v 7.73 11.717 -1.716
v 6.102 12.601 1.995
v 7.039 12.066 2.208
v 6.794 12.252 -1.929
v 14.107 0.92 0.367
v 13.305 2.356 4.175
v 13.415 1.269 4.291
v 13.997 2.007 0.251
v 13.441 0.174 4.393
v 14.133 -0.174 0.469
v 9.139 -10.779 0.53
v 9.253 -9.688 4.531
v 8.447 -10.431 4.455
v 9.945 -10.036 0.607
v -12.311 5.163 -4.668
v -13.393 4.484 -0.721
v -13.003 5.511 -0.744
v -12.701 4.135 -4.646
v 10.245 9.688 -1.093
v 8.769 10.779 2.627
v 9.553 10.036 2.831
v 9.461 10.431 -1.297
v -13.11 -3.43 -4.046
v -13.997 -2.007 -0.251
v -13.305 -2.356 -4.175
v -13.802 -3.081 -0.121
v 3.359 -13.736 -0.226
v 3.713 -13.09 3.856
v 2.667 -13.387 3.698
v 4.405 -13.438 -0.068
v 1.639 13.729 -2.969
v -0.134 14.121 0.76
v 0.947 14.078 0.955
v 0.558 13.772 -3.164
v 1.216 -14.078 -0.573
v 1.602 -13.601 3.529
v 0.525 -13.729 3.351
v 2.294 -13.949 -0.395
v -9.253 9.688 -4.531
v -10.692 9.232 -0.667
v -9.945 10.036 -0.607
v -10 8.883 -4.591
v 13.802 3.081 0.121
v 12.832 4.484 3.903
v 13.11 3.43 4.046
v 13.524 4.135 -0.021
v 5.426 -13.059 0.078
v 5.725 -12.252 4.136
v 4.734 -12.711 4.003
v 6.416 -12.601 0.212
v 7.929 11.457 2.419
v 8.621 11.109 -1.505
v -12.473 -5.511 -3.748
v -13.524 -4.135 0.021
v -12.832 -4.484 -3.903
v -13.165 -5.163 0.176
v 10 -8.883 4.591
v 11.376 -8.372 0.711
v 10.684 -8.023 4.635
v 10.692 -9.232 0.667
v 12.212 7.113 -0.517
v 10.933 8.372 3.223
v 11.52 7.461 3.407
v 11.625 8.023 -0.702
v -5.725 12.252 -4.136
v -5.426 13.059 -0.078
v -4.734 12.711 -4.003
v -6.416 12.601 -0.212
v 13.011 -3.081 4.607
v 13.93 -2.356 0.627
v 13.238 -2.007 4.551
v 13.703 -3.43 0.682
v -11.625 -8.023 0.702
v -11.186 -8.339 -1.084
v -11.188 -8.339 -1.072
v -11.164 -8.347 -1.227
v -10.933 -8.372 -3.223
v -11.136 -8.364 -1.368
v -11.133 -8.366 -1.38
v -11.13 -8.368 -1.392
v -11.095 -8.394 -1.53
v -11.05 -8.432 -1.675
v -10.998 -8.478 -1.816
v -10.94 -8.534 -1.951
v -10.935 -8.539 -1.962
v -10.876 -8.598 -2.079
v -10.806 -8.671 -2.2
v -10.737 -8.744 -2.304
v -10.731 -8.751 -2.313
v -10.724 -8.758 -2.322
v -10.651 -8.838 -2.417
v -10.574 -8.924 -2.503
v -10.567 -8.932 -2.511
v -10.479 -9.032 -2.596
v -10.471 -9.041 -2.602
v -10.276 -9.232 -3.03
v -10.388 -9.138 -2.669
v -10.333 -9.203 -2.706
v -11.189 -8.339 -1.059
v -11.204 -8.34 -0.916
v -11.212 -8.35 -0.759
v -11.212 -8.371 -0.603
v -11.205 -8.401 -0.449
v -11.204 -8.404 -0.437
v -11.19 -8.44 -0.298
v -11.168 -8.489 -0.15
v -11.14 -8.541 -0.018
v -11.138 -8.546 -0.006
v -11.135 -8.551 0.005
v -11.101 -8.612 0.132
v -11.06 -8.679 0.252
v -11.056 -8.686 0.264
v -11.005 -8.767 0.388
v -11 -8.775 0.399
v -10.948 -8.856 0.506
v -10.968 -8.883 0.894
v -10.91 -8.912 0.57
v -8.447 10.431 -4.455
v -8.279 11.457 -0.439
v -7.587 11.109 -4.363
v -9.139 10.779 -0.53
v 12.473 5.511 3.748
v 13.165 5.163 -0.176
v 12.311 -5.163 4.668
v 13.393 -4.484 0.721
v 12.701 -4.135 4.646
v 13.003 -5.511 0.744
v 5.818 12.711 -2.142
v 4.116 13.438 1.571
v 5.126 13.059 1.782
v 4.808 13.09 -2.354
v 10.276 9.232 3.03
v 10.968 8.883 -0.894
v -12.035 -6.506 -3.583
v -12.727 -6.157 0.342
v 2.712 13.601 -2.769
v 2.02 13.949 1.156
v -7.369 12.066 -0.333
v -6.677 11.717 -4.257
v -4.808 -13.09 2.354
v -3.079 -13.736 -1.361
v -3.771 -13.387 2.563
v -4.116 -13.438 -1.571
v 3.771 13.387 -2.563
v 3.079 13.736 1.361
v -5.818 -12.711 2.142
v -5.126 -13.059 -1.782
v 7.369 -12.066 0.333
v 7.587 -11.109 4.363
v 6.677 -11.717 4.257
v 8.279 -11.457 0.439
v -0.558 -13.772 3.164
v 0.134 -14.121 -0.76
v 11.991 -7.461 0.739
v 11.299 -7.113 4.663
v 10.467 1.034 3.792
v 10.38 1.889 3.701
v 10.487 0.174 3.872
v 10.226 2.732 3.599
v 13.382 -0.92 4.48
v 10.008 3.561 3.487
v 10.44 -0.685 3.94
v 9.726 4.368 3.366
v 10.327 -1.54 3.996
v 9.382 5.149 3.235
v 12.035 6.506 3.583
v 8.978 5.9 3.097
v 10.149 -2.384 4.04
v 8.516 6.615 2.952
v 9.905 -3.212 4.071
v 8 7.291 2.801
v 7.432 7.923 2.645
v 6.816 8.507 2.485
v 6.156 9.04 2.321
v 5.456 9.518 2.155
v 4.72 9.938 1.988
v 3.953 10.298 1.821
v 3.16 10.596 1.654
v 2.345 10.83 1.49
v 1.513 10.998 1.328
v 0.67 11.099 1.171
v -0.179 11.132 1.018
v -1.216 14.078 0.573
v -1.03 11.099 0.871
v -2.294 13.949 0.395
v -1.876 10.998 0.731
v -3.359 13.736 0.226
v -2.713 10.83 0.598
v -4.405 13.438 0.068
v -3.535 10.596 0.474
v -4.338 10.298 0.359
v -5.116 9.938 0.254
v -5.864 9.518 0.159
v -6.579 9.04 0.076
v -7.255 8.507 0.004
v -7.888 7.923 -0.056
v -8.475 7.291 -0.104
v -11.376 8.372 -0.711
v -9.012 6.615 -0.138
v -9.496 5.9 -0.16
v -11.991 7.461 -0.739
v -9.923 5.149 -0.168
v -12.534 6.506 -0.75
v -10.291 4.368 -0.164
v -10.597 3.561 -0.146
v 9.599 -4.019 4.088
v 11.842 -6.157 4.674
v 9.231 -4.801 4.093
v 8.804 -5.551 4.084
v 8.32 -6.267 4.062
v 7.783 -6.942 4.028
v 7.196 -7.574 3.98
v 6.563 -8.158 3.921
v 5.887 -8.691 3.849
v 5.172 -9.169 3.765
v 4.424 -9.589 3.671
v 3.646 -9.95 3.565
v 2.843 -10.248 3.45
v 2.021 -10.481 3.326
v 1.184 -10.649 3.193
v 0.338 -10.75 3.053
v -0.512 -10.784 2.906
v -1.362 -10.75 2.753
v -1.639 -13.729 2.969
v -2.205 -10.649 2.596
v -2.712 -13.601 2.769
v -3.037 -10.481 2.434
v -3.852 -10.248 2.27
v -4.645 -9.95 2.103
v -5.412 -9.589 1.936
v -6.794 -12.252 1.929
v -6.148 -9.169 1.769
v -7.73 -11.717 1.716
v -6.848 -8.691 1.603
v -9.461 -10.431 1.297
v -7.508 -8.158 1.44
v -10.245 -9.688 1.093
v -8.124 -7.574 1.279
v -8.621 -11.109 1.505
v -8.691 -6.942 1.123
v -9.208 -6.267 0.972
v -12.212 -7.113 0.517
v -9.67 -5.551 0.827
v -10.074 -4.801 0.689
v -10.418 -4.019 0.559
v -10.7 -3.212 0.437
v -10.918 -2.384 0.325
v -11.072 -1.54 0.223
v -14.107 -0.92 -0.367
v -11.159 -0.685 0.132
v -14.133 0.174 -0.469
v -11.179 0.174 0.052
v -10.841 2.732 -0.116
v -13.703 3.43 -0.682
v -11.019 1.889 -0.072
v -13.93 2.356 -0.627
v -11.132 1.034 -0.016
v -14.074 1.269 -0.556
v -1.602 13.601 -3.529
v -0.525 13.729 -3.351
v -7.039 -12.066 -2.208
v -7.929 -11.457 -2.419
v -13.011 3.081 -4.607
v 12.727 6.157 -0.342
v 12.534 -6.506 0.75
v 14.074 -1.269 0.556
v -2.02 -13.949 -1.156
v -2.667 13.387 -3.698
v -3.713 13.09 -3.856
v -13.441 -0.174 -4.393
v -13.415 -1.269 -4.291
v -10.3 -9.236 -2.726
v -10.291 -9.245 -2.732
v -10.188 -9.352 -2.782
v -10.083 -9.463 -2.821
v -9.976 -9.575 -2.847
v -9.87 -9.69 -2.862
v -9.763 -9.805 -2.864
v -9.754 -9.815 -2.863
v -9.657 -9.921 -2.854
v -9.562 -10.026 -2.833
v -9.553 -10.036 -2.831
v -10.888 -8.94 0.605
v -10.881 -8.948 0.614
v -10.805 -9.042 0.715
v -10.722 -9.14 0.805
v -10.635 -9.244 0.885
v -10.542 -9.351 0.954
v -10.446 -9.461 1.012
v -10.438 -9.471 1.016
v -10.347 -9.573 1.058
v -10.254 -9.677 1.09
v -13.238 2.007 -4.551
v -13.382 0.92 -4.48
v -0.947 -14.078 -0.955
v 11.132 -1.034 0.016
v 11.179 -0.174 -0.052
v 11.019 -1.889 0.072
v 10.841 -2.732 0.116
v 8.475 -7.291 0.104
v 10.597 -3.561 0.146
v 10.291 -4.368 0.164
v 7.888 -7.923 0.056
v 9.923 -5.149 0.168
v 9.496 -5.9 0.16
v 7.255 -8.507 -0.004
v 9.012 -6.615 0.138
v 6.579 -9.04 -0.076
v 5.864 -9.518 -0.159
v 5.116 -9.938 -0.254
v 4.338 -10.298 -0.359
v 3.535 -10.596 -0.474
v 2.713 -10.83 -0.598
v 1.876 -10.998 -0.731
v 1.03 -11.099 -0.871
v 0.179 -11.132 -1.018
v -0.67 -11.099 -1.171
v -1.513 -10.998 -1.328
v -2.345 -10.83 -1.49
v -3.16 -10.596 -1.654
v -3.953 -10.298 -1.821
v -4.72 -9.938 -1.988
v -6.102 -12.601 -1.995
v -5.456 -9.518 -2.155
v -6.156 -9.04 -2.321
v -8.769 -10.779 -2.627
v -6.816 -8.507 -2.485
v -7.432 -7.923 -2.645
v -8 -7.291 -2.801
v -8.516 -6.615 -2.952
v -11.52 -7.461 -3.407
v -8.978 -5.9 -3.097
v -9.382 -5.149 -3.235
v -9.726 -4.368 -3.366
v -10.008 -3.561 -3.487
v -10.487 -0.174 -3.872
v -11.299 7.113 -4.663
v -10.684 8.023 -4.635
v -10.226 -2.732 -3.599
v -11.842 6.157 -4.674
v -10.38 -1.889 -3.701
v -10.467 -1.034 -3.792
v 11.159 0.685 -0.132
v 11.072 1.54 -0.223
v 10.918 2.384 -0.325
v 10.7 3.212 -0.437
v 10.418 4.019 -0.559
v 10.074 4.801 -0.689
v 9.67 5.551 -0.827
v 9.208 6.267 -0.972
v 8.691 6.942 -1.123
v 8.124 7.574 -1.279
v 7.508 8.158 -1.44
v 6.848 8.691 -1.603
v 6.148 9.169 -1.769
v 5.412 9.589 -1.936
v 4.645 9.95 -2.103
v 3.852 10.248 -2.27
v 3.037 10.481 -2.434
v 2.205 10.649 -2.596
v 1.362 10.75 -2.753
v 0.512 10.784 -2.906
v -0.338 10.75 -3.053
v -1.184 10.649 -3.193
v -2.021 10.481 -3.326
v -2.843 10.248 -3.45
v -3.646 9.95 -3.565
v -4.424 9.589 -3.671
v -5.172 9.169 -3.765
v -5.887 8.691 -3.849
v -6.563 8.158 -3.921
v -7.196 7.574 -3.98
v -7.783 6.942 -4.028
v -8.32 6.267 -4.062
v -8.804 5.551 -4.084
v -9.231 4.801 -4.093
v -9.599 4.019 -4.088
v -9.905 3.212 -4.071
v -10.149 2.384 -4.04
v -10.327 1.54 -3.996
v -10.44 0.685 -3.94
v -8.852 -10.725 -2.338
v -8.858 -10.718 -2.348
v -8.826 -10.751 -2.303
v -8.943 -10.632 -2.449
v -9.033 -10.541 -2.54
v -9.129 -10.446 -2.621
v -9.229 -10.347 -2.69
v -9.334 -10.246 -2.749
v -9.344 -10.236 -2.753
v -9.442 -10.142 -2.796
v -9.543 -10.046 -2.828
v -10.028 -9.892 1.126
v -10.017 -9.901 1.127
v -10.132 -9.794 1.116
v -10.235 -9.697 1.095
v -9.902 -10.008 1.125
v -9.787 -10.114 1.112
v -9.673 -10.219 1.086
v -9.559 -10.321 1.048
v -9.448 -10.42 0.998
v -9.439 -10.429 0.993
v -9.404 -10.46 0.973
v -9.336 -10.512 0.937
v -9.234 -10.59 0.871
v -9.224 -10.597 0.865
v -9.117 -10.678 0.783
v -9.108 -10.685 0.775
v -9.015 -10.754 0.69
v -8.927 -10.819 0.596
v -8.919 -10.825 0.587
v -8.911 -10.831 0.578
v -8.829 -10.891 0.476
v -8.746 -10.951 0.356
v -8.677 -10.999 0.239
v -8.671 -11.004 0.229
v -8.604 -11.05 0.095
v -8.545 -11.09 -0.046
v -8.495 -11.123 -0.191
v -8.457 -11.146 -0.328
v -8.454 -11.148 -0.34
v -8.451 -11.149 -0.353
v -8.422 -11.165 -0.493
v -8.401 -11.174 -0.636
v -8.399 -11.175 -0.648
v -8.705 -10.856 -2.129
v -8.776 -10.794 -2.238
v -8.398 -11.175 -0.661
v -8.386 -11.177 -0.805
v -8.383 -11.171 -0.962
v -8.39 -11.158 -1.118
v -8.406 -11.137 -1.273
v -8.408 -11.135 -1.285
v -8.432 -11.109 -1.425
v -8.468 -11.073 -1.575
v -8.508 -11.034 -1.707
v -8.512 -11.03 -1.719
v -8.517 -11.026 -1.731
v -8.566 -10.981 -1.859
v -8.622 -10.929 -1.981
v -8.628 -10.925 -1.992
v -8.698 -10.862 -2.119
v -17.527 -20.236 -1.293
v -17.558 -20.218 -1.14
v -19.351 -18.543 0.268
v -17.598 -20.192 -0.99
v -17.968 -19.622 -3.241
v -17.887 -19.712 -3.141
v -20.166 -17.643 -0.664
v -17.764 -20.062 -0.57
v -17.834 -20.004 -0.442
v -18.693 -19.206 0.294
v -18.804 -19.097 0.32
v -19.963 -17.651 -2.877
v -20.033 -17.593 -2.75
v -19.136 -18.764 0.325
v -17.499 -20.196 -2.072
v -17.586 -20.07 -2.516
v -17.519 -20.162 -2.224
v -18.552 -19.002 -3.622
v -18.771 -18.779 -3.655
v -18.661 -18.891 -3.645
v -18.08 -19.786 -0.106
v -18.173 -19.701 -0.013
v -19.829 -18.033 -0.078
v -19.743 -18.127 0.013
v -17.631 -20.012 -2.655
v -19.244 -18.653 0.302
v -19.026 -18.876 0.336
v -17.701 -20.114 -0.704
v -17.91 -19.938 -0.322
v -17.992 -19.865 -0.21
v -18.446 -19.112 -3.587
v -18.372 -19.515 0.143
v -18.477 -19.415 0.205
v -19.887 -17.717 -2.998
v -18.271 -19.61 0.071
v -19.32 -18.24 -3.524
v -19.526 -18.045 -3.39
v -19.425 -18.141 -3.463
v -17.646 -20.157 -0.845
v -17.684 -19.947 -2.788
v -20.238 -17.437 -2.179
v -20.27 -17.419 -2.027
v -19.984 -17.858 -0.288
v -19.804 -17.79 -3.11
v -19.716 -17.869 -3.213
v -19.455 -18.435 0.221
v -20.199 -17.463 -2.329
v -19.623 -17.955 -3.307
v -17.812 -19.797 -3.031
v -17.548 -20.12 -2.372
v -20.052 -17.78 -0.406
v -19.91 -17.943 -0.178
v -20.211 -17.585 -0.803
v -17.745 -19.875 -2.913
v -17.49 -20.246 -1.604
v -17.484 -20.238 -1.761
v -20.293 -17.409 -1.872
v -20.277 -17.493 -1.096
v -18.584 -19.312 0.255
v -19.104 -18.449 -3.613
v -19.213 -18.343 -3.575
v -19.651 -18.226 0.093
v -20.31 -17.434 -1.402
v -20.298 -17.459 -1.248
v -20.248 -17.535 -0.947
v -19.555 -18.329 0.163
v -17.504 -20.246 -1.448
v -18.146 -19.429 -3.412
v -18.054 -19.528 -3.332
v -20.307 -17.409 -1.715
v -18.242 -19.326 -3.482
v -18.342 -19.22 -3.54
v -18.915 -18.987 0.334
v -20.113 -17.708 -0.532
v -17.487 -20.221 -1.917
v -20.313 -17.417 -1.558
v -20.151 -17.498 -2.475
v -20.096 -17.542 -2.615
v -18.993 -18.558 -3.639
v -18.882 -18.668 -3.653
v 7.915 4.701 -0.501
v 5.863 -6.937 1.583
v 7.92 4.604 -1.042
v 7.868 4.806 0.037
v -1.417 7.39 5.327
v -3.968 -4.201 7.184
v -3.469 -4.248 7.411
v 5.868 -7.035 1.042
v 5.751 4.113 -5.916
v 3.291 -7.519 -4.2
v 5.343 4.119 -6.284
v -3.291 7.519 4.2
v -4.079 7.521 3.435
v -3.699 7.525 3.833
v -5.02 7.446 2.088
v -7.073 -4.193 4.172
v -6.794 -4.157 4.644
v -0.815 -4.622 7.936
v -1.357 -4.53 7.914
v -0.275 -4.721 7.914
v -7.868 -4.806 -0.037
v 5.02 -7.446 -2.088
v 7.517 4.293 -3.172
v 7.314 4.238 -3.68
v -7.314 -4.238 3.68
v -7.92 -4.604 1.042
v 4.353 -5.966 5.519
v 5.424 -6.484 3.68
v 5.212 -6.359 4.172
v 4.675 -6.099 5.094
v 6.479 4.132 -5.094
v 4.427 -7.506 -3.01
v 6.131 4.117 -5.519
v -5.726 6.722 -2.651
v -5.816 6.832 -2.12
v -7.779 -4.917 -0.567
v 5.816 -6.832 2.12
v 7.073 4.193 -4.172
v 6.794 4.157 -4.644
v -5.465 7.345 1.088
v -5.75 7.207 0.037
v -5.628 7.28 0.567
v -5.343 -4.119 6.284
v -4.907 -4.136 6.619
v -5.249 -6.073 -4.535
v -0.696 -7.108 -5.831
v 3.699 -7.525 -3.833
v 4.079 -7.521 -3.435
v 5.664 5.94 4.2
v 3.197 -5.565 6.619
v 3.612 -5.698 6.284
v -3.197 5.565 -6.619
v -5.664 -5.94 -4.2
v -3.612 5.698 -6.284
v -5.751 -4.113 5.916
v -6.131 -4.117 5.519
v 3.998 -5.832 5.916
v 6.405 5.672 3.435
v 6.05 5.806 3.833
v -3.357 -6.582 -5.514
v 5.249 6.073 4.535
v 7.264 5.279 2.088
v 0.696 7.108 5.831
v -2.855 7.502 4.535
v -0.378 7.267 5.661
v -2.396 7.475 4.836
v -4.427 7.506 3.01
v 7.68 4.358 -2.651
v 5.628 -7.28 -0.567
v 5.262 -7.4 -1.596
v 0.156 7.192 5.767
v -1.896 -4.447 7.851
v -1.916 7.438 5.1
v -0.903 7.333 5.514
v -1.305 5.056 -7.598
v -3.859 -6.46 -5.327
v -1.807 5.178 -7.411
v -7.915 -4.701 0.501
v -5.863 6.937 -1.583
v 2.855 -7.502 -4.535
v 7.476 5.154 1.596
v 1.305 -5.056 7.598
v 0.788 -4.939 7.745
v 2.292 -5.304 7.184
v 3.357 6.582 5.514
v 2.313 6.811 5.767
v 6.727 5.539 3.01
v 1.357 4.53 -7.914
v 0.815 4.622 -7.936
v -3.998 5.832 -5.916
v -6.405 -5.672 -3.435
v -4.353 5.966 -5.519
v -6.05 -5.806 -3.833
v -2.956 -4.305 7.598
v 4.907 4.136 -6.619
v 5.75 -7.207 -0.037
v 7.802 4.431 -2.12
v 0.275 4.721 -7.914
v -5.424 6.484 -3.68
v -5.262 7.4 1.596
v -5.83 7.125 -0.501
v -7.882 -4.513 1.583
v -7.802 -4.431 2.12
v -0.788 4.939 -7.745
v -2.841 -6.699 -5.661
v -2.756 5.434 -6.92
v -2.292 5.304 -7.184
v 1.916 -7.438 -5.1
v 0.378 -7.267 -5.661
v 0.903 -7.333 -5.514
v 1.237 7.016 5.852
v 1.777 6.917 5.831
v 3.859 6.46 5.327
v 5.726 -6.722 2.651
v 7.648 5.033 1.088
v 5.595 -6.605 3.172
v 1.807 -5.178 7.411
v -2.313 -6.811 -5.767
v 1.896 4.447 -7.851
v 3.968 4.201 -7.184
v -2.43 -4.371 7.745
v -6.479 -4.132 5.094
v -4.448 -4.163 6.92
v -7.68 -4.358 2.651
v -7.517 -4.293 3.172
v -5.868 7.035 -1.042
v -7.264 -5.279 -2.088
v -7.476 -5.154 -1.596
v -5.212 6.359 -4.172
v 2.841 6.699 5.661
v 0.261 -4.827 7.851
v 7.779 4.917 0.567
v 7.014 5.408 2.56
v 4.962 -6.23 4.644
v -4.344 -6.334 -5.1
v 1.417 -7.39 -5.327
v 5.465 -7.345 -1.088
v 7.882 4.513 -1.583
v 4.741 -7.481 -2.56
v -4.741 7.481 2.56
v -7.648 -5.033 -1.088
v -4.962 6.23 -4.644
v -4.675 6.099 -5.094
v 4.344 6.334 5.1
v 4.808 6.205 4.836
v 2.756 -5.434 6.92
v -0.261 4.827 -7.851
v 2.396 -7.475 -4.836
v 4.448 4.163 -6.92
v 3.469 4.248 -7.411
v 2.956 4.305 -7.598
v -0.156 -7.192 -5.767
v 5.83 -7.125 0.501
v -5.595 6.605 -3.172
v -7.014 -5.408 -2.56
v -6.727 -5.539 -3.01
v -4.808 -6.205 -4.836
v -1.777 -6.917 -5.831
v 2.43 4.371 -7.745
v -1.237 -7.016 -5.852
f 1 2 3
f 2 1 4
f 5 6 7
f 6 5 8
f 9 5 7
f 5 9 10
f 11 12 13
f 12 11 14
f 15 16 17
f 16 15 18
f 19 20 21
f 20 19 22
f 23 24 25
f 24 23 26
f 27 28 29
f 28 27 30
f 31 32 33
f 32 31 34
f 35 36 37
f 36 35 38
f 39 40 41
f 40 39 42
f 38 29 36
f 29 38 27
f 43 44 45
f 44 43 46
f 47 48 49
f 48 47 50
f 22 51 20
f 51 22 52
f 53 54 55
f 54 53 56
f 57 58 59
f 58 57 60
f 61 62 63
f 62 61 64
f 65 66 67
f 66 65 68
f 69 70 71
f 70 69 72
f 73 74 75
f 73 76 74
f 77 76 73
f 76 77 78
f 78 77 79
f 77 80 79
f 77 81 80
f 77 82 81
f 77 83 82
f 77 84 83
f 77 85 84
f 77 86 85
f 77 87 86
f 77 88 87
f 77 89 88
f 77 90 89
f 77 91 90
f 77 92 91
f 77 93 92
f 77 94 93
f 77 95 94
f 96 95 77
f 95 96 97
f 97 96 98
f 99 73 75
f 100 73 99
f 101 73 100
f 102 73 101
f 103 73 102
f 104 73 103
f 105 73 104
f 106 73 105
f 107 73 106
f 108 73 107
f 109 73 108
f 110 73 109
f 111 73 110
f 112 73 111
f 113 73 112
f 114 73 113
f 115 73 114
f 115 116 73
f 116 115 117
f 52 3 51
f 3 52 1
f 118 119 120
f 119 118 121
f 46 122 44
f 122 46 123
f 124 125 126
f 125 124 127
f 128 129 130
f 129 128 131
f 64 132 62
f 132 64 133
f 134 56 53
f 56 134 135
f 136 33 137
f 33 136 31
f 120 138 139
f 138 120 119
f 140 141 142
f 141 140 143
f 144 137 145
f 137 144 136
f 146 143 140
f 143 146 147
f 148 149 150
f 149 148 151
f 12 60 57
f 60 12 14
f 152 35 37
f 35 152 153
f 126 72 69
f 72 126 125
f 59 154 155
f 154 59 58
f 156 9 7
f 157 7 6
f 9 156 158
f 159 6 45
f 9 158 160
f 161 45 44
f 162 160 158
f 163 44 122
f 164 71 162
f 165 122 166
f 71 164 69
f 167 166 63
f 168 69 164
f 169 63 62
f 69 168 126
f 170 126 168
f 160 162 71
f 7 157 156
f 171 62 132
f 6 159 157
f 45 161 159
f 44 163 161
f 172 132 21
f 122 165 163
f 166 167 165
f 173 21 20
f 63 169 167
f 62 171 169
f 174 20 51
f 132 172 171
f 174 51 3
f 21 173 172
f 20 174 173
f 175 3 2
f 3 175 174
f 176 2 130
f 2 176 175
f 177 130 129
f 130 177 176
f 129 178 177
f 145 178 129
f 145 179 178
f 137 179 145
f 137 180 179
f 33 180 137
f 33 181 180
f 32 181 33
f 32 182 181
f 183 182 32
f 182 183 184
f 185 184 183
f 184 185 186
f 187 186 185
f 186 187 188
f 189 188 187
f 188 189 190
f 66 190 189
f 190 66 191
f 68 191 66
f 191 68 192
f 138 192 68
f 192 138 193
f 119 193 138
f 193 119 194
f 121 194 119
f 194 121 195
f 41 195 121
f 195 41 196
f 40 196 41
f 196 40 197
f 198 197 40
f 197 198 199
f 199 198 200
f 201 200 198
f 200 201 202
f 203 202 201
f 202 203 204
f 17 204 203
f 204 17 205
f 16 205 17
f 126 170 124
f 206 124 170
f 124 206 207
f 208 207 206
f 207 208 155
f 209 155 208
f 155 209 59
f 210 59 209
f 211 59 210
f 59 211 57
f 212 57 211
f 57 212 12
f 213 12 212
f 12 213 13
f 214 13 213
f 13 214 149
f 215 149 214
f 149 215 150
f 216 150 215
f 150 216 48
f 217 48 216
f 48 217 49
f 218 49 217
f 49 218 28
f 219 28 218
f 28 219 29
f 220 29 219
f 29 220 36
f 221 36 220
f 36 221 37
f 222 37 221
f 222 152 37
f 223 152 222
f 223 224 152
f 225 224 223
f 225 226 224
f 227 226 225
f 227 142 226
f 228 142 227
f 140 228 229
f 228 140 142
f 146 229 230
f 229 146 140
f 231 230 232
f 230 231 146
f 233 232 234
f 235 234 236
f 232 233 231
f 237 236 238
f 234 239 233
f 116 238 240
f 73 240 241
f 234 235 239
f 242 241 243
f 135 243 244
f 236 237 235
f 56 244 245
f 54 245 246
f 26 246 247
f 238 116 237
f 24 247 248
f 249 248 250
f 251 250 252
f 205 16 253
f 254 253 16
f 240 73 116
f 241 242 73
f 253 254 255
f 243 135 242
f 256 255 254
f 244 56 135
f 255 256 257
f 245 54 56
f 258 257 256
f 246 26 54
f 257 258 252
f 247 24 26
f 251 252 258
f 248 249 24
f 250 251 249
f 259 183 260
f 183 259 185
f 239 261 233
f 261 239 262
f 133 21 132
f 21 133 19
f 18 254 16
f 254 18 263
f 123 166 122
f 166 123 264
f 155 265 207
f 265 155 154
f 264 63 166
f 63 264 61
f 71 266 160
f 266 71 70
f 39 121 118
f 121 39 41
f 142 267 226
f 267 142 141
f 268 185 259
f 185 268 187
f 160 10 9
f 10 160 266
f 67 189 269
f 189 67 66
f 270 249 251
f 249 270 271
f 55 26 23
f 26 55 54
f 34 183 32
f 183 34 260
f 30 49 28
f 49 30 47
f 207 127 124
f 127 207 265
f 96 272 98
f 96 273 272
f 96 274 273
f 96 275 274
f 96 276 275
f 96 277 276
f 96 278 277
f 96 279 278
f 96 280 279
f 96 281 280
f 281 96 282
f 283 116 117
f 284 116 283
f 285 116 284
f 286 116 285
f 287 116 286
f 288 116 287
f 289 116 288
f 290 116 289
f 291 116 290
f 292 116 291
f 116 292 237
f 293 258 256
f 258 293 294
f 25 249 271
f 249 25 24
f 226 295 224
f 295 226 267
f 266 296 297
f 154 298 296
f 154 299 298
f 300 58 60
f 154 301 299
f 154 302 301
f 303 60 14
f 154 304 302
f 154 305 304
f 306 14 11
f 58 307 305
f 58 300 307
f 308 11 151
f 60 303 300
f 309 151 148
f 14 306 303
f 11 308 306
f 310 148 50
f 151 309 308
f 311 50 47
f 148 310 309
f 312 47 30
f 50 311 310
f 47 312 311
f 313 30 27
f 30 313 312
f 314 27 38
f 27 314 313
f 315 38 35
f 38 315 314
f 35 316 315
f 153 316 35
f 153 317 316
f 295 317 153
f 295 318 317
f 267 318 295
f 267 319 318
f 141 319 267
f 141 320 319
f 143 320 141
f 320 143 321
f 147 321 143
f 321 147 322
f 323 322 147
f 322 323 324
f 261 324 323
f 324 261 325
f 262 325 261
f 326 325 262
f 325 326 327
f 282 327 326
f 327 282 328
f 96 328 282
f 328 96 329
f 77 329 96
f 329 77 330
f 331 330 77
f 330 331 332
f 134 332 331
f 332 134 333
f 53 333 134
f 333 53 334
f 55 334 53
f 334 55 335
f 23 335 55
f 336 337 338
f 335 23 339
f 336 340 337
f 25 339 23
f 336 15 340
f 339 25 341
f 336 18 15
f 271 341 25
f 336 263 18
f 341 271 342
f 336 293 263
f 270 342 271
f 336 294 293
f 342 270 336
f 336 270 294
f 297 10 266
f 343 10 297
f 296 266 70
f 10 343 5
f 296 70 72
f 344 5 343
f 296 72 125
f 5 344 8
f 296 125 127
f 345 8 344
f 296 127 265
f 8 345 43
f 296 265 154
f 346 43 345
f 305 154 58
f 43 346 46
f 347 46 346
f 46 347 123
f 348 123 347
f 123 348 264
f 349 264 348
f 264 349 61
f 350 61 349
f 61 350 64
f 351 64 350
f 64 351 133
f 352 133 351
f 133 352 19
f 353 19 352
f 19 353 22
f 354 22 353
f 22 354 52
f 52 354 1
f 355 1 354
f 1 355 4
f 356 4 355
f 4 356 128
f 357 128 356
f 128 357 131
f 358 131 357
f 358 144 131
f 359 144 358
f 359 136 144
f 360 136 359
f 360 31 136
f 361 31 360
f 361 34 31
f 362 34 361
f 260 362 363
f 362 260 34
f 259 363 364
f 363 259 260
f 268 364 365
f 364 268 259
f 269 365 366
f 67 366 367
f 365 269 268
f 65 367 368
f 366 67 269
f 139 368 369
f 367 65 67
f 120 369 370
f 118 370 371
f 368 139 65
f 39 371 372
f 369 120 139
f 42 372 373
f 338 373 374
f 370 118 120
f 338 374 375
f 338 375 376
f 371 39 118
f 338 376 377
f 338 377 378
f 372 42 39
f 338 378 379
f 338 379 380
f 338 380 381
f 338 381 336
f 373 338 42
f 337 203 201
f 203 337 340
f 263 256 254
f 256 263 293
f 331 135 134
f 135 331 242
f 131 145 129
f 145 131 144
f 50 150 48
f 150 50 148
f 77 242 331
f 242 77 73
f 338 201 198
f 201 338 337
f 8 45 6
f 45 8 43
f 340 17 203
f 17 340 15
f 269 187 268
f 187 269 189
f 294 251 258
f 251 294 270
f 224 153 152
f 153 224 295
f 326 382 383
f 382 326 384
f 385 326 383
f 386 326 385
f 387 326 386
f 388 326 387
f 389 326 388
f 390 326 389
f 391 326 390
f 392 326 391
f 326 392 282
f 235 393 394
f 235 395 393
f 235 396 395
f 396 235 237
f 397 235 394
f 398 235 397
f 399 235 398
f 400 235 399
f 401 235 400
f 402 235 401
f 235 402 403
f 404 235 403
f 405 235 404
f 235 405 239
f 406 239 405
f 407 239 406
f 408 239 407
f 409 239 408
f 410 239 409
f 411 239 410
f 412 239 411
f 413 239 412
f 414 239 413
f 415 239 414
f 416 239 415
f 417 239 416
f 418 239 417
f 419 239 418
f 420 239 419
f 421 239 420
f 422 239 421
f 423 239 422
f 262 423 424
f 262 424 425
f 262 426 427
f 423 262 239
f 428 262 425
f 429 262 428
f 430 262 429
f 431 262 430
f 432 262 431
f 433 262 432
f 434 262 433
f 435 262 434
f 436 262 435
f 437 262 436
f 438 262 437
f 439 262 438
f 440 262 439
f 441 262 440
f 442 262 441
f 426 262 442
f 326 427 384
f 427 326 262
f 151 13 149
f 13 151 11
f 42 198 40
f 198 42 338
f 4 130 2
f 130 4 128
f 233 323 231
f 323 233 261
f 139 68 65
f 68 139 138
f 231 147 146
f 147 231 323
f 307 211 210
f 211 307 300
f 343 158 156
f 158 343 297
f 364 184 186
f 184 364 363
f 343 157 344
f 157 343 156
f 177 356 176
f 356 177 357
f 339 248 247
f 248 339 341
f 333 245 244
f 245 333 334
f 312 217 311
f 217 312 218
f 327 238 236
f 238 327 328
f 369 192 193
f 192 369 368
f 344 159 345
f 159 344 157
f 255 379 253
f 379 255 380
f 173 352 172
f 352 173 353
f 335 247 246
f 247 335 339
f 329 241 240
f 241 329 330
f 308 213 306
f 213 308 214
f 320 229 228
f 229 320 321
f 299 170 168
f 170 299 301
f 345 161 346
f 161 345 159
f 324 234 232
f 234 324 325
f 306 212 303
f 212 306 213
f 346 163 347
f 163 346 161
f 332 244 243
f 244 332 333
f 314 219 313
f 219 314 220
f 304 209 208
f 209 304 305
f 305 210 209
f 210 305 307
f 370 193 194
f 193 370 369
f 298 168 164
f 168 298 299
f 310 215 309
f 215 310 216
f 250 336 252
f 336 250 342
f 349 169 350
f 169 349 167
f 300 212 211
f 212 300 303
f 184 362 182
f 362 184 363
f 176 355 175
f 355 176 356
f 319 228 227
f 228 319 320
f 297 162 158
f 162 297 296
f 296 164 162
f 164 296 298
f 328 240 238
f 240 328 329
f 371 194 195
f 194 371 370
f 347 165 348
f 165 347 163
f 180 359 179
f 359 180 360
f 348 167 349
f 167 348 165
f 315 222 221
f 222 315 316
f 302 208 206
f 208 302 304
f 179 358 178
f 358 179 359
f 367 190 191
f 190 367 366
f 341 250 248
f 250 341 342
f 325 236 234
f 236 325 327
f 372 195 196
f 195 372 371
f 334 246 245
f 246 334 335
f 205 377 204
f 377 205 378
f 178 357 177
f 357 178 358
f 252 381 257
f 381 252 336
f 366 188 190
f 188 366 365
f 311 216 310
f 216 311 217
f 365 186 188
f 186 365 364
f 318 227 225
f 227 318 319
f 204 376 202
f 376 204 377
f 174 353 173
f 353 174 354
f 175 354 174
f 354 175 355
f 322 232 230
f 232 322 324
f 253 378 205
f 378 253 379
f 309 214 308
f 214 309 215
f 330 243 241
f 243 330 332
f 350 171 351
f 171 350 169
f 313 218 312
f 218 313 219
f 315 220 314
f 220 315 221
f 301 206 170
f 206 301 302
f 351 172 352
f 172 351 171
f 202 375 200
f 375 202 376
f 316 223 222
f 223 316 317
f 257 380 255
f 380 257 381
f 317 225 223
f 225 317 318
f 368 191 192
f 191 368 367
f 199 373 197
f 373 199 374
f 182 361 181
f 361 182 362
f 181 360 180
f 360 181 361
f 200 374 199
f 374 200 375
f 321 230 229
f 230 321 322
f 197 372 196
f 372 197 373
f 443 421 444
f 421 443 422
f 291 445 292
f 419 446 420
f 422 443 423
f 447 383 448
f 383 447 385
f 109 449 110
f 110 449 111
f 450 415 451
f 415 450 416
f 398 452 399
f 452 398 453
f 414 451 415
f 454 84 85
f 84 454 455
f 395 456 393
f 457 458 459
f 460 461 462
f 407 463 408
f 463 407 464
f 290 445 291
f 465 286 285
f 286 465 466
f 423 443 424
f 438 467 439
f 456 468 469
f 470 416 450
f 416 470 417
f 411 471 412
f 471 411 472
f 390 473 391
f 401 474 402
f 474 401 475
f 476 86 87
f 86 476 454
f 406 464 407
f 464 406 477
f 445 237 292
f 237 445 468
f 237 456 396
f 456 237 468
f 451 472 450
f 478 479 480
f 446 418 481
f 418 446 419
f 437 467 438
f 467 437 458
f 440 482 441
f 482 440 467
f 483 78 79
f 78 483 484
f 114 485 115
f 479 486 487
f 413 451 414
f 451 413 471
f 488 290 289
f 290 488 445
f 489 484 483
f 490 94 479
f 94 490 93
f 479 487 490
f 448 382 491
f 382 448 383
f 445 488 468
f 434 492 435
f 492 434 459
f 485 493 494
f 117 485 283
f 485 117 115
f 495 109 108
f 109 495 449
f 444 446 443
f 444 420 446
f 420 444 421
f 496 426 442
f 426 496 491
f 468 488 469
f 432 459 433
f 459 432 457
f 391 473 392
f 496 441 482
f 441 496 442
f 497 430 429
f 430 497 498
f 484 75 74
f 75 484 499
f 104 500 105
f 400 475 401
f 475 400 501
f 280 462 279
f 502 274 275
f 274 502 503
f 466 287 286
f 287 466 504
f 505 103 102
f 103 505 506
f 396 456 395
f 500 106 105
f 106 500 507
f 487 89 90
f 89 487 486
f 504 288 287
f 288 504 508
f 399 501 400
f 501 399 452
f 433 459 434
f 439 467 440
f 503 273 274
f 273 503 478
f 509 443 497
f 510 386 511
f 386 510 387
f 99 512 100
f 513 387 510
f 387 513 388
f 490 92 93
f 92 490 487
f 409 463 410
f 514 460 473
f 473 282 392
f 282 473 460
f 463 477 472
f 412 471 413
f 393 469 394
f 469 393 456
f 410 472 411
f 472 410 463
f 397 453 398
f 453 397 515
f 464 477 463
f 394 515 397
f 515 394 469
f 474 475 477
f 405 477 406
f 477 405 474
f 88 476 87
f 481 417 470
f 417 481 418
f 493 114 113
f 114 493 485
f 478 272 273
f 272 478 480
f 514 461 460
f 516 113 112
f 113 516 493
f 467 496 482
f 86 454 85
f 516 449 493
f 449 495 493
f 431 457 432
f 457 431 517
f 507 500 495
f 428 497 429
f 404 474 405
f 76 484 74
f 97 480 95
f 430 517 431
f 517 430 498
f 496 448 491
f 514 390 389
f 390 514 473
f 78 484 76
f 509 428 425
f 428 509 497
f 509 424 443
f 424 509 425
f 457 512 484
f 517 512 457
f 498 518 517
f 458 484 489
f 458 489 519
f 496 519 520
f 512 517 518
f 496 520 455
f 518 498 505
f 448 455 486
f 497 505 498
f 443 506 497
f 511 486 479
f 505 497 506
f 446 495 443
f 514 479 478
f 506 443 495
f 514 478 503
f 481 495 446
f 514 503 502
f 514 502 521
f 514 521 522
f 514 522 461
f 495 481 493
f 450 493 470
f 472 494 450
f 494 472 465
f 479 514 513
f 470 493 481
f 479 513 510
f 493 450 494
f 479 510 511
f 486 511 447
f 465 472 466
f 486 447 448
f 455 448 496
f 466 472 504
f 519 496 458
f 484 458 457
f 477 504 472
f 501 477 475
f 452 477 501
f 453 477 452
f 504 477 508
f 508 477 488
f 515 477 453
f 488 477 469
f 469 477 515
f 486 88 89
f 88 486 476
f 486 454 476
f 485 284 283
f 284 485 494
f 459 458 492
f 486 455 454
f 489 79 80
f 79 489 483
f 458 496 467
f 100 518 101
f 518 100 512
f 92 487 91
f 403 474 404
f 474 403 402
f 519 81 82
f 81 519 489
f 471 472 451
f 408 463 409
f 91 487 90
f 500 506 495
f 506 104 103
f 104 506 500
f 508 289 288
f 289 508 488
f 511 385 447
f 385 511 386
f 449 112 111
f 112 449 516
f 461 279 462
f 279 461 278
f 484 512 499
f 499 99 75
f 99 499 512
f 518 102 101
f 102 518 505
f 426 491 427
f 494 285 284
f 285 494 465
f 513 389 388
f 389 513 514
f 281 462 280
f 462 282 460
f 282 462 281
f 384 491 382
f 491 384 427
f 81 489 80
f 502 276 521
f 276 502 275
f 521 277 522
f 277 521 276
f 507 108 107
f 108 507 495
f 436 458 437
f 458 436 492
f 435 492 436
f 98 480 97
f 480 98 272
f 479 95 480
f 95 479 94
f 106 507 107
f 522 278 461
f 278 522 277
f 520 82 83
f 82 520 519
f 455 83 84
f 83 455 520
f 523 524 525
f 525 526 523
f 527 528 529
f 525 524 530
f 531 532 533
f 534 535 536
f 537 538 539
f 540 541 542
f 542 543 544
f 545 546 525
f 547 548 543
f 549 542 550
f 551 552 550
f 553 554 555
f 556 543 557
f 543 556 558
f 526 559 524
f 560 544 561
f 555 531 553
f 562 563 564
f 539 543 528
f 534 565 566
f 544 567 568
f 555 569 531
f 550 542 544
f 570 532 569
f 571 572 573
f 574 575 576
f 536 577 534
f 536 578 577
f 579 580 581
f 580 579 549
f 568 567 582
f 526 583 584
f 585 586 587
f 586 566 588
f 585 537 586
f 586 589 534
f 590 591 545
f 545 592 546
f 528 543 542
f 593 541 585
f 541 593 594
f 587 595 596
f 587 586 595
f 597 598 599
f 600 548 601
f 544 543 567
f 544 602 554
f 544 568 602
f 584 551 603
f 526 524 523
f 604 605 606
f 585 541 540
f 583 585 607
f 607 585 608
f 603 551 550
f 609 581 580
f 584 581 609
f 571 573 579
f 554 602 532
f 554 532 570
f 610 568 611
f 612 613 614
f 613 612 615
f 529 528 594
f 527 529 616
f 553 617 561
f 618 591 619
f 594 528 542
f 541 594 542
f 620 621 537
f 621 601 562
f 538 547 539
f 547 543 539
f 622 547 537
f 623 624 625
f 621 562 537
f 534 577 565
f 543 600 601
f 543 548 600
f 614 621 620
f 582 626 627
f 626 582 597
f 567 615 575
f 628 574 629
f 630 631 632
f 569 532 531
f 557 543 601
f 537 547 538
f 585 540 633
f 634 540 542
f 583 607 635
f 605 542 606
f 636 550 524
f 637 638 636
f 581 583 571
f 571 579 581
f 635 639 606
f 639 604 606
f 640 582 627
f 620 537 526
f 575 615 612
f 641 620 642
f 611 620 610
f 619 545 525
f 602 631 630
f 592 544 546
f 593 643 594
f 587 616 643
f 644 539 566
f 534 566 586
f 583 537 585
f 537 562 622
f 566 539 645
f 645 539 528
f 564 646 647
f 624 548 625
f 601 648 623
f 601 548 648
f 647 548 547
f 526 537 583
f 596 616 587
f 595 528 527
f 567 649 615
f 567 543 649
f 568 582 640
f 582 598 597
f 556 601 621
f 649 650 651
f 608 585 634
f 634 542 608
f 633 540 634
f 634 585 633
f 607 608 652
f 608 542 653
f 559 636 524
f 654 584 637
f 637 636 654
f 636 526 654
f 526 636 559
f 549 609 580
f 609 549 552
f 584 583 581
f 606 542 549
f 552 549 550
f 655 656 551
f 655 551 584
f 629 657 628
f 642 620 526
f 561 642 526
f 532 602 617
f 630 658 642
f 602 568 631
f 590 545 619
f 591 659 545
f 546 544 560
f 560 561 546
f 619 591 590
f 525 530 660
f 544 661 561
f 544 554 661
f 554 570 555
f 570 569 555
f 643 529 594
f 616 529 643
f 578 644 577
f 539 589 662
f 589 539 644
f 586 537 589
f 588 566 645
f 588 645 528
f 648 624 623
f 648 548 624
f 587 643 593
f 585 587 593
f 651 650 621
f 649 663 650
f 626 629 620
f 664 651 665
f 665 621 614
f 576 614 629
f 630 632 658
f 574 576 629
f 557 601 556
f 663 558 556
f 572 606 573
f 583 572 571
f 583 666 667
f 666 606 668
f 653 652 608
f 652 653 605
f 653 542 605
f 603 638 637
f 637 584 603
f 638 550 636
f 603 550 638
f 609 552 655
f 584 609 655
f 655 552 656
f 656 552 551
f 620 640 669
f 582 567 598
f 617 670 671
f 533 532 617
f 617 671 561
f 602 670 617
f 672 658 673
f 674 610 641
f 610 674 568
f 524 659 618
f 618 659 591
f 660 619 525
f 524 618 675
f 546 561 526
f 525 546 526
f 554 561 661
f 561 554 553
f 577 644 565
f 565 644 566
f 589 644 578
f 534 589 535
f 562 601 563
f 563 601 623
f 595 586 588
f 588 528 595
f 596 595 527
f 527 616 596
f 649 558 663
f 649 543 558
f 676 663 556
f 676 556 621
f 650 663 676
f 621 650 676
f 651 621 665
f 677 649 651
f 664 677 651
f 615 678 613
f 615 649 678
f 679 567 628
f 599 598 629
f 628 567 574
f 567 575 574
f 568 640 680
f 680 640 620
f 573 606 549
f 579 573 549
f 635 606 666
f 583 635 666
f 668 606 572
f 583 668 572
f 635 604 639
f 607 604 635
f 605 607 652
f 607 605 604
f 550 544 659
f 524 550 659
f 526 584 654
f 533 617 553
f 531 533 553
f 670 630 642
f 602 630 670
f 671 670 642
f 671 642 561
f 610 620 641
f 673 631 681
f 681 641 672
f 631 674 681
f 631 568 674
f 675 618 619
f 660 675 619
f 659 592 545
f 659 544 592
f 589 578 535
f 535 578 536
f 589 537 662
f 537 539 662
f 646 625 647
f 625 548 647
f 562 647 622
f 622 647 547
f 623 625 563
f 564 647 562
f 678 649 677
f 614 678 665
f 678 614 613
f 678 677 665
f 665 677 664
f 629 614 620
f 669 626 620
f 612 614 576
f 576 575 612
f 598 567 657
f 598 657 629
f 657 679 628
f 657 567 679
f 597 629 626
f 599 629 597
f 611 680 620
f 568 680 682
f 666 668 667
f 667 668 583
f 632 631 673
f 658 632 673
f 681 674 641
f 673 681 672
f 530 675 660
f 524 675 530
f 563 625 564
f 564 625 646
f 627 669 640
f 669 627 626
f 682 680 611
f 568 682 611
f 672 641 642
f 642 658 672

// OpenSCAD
//=============================================================================
// Icon used to toggle the Inspector: An object inside a magnifying glass.
//=============================================================================

module MagnifyingGlass() {
  module Glass() {
    difference() {
      cylinder(r = 14, h = 4, center = true);
      cylinder(r = 11, h = 8, center = true);
    }
  }
  module Handle() {
    cylinder(r = 2, h = 14);
  }
  Glass();
  translate([-9, -9, 0]) rotate([90, 0, -45]) Handle();
}

module Object() {
  cylinder(r = 7, h = 12, center = true);
}

module InspectorIcon() {
  rotate([-5, -10, 0]) MagnifyingGlass();
  rotate([80, 0, -10]) Object();
}

$fn = 80;
InspectorIcon();
